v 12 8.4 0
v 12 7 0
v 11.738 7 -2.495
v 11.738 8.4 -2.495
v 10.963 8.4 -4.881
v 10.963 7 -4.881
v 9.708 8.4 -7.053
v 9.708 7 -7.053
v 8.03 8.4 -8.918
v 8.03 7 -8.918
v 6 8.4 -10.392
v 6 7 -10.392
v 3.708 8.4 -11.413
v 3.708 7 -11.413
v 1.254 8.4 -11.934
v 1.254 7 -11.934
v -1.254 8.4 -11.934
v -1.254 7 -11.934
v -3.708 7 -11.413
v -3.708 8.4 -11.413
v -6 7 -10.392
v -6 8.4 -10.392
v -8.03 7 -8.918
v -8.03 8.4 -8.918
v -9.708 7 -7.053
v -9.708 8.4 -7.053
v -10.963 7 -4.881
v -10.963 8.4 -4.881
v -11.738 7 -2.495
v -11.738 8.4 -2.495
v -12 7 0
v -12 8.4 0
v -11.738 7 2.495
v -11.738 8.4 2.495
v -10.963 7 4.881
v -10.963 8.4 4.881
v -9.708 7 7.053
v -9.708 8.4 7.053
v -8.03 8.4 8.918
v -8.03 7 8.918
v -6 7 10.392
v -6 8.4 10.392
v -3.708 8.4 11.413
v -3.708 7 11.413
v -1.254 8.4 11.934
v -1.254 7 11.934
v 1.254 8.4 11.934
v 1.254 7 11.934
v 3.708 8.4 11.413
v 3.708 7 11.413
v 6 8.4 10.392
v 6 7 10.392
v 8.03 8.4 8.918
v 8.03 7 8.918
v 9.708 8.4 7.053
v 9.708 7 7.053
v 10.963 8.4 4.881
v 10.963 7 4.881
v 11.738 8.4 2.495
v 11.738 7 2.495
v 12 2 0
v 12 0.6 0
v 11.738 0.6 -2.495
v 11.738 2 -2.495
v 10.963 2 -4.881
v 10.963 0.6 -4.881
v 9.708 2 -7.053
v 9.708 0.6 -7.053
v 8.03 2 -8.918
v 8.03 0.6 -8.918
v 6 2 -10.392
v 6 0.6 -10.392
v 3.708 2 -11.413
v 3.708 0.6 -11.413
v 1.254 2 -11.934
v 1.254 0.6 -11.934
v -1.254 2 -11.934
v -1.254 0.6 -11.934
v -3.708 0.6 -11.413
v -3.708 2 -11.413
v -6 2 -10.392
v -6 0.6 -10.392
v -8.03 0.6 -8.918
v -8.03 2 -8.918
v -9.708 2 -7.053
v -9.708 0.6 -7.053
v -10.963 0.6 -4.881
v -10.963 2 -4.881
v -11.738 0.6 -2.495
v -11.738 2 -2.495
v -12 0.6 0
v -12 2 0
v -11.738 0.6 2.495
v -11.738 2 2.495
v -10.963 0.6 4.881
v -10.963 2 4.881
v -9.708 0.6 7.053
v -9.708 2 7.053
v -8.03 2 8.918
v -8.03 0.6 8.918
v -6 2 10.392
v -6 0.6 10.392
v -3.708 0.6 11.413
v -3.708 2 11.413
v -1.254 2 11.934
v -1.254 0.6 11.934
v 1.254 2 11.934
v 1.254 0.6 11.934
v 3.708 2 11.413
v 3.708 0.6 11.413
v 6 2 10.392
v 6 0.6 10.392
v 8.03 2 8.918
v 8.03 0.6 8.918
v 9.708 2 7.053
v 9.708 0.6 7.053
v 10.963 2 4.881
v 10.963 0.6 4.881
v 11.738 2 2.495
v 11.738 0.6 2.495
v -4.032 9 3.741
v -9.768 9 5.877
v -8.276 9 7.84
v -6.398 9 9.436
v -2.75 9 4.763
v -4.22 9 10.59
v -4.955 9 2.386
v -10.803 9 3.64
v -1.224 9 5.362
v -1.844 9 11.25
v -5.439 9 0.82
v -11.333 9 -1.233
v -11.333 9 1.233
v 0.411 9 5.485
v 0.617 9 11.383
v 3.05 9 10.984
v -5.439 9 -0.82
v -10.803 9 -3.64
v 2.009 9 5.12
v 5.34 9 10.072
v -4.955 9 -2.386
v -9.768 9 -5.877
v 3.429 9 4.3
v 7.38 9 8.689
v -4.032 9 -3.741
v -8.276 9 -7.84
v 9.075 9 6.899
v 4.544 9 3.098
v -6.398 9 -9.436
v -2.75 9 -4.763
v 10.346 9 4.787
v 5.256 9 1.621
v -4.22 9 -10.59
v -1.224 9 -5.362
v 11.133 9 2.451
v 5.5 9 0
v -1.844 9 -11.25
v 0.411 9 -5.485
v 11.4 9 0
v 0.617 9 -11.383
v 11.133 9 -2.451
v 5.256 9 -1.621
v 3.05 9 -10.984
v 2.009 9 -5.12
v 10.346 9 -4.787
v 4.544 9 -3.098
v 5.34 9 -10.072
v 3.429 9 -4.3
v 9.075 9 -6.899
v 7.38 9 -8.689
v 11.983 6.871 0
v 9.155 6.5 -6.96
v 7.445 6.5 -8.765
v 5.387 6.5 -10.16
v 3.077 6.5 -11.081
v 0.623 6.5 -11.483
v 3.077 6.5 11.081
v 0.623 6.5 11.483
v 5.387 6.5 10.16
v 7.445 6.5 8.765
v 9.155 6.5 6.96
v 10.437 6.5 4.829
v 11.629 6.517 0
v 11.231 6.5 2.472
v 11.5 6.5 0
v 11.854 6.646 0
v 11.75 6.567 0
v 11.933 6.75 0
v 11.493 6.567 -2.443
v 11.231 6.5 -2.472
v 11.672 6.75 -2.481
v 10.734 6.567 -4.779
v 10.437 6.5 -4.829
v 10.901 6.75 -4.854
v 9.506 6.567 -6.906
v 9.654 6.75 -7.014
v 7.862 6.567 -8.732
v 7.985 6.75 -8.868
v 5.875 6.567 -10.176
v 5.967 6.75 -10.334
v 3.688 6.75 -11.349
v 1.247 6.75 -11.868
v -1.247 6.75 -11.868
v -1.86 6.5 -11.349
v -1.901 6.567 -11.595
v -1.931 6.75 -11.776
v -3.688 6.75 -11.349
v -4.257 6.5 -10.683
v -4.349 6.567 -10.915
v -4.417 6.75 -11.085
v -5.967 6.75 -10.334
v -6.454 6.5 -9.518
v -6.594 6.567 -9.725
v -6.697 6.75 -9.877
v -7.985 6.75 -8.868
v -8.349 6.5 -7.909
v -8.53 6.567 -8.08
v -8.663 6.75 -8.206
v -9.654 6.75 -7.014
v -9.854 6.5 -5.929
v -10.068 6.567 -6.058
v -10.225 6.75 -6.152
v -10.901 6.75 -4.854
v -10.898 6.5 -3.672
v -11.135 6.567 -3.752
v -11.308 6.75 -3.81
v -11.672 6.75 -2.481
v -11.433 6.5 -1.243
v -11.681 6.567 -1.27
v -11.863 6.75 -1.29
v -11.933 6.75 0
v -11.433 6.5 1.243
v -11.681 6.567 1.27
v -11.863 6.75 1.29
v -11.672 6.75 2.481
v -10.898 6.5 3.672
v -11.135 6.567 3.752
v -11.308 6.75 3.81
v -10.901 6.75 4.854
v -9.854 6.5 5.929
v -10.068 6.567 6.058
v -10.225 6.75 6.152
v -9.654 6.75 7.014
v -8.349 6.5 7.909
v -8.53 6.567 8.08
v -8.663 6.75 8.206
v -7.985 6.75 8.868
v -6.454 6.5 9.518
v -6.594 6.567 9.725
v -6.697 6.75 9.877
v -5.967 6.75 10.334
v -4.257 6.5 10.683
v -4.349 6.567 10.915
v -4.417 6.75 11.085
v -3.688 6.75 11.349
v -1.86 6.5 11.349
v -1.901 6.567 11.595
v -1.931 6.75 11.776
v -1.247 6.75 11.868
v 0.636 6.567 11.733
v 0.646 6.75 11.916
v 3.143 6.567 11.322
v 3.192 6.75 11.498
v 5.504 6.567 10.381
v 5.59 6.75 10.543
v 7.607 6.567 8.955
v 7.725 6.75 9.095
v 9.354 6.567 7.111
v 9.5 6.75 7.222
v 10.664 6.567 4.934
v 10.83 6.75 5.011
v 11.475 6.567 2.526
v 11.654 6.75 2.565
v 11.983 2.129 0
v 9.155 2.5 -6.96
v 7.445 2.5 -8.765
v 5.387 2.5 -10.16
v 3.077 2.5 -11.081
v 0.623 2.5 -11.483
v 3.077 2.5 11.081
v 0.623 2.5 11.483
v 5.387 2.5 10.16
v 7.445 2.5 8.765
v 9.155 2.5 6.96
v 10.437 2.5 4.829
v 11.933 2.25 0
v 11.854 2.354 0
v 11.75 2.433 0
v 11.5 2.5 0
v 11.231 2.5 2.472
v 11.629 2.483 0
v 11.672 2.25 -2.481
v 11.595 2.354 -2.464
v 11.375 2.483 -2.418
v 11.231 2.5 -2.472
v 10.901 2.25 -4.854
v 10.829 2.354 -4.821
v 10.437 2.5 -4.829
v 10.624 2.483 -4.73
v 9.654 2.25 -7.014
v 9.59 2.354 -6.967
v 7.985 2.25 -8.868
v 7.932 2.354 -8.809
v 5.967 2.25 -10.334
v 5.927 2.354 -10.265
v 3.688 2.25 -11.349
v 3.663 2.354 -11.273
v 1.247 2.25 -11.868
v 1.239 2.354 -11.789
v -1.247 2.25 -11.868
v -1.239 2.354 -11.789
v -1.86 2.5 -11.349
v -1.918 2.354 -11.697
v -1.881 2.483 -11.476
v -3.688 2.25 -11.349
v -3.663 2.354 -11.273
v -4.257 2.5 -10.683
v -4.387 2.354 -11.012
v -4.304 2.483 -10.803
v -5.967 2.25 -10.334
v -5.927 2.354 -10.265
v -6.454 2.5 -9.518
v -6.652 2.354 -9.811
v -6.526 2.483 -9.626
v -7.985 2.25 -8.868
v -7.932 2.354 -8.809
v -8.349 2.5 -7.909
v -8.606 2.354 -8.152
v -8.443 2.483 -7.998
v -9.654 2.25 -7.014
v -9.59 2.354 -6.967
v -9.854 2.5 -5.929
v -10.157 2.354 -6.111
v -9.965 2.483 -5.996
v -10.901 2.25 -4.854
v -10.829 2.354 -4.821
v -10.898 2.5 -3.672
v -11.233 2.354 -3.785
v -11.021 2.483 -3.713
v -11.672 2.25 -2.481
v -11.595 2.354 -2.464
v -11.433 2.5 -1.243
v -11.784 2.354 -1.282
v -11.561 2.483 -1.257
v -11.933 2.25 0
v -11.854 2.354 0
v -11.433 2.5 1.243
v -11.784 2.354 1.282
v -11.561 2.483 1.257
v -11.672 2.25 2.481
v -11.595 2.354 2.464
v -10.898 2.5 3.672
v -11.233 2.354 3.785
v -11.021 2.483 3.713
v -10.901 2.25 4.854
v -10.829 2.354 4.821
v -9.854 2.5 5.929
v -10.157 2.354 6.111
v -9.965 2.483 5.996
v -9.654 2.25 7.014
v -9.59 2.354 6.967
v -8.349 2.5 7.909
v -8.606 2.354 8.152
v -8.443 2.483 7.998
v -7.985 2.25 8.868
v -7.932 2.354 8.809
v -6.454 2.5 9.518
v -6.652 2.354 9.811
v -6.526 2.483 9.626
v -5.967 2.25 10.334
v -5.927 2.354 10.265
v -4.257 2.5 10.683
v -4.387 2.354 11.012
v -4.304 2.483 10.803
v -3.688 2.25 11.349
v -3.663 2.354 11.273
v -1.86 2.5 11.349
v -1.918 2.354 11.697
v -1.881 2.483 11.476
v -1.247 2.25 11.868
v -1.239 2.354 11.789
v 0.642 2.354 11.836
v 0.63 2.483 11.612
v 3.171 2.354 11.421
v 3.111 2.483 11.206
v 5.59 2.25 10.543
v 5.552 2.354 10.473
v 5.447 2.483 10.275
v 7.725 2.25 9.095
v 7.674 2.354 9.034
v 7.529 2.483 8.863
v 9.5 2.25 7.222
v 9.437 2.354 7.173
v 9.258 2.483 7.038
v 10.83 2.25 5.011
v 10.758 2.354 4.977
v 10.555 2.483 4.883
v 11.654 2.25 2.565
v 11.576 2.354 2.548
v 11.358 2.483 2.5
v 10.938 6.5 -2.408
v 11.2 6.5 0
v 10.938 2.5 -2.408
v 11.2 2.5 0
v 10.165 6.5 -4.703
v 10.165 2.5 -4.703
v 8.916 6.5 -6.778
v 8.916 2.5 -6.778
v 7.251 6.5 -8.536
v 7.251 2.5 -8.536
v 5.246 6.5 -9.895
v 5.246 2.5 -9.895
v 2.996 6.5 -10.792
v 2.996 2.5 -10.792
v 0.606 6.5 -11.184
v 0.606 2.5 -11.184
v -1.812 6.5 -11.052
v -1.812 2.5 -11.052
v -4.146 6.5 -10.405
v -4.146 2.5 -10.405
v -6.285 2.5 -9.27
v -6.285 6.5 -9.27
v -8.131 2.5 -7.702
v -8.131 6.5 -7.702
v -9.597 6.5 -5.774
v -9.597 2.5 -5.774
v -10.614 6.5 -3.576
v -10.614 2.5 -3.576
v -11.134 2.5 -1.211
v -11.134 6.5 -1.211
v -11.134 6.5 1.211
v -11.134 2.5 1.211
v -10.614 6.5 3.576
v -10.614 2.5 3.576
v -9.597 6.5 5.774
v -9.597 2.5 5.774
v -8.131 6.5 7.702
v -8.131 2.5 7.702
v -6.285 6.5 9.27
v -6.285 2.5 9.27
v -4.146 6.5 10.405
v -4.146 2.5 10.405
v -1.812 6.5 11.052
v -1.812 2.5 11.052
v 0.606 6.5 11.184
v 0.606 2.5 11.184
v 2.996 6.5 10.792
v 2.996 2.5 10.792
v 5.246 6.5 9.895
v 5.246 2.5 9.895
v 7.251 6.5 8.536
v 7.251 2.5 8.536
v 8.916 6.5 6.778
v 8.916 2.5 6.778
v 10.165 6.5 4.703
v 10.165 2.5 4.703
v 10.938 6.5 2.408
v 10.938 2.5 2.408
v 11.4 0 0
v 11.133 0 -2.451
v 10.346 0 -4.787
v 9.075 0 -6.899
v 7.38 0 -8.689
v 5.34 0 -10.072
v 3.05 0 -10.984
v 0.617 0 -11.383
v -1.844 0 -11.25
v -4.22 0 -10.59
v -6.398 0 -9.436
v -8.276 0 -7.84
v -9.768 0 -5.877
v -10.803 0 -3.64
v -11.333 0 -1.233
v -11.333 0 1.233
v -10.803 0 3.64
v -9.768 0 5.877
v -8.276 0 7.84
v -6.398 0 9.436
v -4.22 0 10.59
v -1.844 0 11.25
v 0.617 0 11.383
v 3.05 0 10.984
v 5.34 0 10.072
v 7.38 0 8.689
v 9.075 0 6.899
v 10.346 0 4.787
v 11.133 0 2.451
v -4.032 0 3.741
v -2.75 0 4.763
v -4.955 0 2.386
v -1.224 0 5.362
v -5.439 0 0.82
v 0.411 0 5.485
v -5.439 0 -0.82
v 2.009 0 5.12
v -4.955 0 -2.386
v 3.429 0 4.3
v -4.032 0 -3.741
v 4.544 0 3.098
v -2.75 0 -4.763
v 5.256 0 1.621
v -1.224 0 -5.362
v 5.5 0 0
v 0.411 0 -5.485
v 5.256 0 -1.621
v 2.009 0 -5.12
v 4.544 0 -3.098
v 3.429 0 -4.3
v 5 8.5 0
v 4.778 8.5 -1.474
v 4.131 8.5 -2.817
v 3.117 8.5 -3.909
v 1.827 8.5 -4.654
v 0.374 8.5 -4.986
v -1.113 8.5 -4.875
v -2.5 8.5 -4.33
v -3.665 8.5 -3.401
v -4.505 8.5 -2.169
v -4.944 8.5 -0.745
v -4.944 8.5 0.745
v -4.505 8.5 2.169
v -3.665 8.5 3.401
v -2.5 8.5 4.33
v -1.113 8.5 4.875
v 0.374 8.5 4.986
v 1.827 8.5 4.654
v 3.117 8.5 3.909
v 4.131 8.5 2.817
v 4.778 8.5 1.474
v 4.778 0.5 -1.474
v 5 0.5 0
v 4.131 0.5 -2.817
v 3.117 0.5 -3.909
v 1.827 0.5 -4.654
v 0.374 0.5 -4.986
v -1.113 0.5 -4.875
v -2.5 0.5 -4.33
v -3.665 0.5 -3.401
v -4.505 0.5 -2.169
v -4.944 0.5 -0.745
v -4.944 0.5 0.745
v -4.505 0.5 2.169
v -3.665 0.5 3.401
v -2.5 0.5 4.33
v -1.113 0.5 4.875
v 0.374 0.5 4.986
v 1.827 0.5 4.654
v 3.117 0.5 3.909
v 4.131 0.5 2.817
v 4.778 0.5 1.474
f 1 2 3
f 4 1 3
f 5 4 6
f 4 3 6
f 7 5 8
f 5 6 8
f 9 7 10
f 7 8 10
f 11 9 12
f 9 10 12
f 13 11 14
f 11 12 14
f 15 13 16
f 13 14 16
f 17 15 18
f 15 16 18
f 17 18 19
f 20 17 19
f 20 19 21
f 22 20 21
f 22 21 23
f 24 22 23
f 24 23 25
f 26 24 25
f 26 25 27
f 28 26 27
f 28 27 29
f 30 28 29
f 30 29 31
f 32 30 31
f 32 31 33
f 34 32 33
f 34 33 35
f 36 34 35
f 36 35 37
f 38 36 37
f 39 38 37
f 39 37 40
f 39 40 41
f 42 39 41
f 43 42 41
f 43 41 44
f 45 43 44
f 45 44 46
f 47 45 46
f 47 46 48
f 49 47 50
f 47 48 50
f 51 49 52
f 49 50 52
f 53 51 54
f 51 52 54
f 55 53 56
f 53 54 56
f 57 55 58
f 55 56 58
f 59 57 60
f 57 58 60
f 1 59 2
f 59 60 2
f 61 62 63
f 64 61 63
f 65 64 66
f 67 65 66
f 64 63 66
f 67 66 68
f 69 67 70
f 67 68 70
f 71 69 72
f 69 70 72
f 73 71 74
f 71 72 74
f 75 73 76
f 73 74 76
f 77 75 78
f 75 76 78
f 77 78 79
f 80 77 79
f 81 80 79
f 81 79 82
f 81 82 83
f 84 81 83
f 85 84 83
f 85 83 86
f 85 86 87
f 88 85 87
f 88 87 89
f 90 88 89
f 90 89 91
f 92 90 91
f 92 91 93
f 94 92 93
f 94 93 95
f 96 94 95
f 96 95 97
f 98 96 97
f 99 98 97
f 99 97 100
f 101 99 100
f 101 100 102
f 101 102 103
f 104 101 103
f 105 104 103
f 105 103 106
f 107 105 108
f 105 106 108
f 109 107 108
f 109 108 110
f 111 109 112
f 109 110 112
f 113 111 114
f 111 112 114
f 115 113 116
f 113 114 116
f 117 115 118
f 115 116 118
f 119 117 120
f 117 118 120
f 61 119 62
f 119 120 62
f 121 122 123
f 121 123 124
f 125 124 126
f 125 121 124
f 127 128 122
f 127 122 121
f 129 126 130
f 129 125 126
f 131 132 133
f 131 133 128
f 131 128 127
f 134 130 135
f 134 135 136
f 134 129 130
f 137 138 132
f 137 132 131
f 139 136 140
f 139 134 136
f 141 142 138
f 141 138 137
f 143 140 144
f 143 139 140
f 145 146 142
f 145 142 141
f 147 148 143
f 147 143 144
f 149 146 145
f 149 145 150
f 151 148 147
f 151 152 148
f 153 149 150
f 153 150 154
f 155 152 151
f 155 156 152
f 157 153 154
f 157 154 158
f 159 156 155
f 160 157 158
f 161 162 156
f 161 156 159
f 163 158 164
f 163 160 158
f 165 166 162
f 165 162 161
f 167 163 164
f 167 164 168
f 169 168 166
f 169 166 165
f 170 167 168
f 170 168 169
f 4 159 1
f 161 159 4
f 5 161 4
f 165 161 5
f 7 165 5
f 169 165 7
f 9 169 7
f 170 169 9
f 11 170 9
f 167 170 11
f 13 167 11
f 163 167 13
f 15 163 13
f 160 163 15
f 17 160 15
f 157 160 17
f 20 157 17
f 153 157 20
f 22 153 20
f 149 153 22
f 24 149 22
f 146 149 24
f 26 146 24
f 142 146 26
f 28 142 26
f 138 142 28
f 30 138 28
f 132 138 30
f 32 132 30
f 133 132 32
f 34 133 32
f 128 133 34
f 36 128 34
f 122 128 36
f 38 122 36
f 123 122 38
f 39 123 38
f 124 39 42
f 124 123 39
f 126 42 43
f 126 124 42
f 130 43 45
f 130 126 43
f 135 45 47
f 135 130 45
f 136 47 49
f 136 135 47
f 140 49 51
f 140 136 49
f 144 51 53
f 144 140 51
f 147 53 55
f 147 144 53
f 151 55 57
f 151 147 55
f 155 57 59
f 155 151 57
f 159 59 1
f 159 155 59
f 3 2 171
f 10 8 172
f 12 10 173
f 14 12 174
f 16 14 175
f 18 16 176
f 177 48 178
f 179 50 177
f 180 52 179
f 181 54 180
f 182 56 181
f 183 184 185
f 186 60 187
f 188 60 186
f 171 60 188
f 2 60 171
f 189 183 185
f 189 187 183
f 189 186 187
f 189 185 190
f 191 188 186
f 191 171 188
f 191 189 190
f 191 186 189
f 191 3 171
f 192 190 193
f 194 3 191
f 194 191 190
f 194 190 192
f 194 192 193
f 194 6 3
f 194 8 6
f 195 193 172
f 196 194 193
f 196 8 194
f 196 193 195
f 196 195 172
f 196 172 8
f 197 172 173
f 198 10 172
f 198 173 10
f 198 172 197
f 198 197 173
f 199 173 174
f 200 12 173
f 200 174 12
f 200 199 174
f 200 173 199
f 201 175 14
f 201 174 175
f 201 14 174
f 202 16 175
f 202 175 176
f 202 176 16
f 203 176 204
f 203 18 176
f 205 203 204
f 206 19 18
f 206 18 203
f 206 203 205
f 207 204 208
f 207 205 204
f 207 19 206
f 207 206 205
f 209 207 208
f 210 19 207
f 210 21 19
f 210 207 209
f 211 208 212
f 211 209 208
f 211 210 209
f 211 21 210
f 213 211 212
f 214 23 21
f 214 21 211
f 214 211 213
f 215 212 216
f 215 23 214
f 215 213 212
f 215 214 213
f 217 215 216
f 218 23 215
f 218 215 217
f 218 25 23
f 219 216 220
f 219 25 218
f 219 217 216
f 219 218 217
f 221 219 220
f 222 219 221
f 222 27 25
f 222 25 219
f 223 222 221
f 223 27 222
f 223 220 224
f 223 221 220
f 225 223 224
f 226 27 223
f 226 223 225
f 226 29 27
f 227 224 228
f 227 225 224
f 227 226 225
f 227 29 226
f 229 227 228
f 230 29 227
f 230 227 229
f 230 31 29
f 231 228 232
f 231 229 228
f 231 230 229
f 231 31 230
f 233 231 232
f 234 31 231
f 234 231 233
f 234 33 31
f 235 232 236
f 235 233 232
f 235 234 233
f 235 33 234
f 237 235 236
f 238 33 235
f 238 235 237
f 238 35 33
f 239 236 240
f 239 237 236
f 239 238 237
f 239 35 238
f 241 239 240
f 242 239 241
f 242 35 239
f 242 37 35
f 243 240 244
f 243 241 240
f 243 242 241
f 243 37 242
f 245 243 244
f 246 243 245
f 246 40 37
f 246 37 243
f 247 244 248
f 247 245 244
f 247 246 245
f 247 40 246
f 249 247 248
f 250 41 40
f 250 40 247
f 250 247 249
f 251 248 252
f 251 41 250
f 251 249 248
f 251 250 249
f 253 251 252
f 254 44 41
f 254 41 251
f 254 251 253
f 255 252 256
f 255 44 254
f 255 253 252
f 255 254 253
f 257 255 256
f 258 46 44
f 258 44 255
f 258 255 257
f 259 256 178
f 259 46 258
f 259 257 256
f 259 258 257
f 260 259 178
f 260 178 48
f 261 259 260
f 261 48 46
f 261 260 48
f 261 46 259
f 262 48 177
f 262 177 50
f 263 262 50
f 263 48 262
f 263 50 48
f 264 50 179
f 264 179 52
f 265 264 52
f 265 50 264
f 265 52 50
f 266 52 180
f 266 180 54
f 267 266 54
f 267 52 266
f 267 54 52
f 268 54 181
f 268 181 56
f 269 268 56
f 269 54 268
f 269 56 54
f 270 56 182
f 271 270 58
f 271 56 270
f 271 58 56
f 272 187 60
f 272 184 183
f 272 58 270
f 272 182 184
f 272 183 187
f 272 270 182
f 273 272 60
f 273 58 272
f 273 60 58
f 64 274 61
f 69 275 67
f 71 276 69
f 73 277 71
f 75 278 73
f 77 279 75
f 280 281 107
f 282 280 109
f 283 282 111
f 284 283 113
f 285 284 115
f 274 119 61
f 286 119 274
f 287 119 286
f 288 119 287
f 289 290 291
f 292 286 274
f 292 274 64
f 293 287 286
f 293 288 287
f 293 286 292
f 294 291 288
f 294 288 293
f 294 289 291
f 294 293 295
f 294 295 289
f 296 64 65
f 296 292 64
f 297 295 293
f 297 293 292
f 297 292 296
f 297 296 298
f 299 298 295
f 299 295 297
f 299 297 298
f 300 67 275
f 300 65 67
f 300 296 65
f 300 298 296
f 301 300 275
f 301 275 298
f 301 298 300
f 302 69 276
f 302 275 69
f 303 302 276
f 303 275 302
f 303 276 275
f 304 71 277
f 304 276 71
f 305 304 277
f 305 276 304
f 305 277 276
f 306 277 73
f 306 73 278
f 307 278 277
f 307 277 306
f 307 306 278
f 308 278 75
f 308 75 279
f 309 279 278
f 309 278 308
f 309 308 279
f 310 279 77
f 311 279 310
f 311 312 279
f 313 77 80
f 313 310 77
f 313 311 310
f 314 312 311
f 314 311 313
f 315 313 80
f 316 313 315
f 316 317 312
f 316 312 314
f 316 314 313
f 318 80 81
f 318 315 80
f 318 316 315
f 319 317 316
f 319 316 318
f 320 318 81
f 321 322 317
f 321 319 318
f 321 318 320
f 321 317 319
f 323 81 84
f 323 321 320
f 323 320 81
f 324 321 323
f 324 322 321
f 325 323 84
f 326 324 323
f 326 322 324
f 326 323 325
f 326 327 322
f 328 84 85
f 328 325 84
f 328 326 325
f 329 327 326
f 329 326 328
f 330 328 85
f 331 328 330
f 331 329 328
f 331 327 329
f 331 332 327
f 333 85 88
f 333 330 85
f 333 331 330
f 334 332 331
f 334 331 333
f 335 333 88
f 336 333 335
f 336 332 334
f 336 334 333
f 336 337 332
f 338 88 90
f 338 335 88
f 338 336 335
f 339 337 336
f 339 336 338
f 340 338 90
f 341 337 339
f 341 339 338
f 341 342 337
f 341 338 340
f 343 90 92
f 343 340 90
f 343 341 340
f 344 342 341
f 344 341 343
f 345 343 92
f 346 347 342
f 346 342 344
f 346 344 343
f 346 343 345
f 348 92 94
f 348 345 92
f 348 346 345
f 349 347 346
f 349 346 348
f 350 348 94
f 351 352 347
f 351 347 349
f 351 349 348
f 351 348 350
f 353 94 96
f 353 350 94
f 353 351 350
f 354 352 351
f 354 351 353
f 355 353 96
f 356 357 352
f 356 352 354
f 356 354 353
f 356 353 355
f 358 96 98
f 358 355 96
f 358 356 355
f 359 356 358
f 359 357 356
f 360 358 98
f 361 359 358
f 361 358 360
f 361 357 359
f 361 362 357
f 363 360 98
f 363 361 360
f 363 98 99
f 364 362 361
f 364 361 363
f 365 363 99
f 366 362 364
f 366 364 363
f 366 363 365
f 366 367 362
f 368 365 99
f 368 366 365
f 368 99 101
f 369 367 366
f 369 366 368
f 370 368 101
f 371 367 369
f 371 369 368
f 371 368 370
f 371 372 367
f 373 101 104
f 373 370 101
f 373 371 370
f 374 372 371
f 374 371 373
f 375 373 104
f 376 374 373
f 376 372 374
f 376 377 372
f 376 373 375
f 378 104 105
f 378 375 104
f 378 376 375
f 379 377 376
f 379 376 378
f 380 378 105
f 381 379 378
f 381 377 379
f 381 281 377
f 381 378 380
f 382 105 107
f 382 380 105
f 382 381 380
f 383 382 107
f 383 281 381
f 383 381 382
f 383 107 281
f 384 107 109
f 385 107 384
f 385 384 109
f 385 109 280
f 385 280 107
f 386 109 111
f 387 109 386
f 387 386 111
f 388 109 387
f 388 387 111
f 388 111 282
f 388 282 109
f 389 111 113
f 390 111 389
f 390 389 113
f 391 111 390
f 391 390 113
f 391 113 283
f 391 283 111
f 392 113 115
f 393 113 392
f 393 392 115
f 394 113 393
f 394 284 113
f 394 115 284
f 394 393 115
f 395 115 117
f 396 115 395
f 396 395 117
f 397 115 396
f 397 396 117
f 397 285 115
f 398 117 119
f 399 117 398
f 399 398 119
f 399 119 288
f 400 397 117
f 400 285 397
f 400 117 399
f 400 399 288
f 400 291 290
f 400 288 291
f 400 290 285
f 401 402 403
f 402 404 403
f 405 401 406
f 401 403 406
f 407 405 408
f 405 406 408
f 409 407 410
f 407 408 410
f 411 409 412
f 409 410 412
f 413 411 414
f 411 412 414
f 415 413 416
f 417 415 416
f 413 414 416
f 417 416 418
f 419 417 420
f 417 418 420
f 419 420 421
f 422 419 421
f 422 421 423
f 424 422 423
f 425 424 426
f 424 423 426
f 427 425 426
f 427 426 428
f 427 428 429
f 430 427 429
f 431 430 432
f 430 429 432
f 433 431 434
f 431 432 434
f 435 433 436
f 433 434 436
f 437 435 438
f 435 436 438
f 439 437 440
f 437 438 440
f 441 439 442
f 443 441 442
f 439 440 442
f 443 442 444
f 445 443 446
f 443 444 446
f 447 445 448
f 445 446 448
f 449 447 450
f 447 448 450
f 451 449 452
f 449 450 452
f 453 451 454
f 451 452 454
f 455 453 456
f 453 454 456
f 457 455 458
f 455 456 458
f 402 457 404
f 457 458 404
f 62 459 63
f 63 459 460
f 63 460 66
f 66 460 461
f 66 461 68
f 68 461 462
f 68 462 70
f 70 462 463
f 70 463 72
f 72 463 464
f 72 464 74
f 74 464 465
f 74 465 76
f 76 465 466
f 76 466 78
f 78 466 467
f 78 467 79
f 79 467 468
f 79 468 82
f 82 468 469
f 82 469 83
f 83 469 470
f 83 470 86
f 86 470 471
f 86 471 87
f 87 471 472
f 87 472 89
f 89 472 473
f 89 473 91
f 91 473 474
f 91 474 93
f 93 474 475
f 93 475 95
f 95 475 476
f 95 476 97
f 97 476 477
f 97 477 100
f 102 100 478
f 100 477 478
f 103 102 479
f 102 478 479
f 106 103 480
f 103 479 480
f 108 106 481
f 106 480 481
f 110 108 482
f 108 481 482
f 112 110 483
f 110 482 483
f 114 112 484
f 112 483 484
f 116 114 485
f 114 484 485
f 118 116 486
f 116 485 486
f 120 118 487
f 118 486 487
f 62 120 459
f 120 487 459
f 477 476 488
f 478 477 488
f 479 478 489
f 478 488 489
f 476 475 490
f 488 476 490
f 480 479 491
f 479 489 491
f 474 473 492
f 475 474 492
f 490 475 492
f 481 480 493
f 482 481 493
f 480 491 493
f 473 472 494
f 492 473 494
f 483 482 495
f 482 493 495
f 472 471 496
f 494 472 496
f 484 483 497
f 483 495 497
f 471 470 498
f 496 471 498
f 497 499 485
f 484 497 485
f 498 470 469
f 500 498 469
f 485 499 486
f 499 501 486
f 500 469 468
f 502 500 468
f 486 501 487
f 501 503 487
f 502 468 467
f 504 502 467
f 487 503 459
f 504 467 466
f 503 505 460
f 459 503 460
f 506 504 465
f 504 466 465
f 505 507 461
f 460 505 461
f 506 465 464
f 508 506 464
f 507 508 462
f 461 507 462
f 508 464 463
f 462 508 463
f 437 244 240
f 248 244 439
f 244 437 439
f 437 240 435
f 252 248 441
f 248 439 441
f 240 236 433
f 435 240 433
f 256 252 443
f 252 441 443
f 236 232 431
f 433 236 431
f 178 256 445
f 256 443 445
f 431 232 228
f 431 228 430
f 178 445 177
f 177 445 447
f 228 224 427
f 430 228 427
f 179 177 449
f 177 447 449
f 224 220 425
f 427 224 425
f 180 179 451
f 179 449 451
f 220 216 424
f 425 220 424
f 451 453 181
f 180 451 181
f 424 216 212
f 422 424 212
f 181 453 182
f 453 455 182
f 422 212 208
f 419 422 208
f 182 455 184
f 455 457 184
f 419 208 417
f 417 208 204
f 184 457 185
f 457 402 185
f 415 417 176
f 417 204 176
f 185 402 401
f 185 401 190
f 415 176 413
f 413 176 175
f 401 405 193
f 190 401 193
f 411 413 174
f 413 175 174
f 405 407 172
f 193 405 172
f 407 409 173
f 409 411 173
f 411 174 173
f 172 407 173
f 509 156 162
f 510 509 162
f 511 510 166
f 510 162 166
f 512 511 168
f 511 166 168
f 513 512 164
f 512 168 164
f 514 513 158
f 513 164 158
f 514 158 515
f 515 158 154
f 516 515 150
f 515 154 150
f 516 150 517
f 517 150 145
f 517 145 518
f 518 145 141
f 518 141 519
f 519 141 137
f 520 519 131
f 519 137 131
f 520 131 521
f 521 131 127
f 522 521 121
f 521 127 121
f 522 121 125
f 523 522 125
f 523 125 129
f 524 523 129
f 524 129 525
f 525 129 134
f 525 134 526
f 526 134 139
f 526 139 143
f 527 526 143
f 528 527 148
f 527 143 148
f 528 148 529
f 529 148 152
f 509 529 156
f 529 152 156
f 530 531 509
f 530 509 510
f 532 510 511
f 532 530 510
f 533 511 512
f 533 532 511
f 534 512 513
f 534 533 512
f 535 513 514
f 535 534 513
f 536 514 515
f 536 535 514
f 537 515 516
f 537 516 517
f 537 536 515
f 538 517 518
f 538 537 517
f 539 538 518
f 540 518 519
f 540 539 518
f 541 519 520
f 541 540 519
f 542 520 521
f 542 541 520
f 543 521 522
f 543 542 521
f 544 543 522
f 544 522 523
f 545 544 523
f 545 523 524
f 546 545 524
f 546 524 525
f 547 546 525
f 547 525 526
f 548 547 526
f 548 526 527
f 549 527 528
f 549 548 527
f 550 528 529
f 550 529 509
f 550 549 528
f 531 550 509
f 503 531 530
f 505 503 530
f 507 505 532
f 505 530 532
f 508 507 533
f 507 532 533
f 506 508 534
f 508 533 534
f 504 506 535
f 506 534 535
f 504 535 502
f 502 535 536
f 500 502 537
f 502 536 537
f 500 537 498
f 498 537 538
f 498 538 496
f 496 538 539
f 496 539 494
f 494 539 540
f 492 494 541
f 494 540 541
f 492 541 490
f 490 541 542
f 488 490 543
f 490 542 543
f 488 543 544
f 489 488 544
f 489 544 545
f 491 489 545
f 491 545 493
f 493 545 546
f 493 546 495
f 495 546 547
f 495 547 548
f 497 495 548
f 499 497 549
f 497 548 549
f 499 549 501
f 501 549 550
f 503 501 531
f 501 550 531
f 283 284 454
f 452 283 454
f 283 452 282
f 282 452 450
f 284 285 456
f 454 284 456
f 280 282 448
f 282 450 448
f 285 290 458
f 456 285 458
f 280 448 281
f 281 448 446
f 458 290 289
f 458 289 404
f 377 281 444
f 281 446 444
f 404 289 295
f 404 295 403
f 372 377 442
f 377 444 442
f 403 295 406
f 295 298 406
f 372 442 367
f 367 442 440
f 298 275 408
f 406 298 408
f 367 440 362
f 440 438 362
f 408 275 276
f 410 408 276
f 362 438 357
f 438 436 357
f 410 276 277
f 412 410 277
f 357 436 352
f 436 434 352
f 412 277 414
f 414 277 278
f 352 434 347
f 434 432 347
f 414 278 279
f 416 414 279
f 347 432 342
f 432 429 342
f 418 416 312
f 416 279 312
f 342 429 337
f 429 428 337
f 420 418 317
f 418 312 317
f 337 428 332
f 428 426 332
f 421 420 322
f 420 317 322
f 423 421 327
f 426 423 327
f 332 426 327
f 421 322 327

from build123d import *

# Parameters (mm, degrees)
SKETCH_1_R      = 12
SKETCH_1_R_2    = 5
EXTRUDE_1_DEPTH = 9
CHAMFER_1_SIZE  = 0.6
FILLET_1_R      = 0.5
CHAMFER_2_SIZE  = 0.5


with BuildPart() as part:
    # 草图1 → 凸台-拉伸1 (new body)
    with BuildSketch(Plane(origin=(0, 0, 0), x_dir=(1, 0, 0), z_dir=(0, 1, 0))):
        Circle(SKETCH_1_R)
        Circle(SKETCH_1_R_2, mode=Mode.SUBTRACT)
    extrude(amount=EXTRUDE_1_DEPTH)

    # 倒角1
    chamfer_1_edges = [part.edges().sort_by_distance(p)[0] for p in [
        (-12, 0, 0),
        (-12, 9, 0),
    ]]
    chamfer(chamfer_1_edges, length=CHAMFER_1_SIZE)

    # 草图2 → 切除-旋转1 (revolve, cut)
    with BuildSketch(Plane.XY):
        Polygon((12, 6.5), (11.2, 6.5), (11.2, 2.5), (12, 2.5), (14.67598619, 3.734930545), align=None)
    revolve(axis=Axis((0, 0, 0), (0, 1, 0)), mode=Mode.SUBTRACT)

    # 圆角1
    fillet_1_edges = [part.edges().sort_by_distance(p)[0] for p in [
        (-12, 6.5, 0),
        (-12, 2.5, 0),
    ]]
    fillet(fillet_1_edges, radius=FILLET_1_R)

    # 倒角2
    chamfer_2_edges = [part.edges().sort_by_distance(p)[0] for p in [
        (-5, 0, 0),
        (-5, 9, 0),
    ]]
    chamfer(chamfer_2_edges, length=CHAMFER_2_SIZE)


solid = part.part
